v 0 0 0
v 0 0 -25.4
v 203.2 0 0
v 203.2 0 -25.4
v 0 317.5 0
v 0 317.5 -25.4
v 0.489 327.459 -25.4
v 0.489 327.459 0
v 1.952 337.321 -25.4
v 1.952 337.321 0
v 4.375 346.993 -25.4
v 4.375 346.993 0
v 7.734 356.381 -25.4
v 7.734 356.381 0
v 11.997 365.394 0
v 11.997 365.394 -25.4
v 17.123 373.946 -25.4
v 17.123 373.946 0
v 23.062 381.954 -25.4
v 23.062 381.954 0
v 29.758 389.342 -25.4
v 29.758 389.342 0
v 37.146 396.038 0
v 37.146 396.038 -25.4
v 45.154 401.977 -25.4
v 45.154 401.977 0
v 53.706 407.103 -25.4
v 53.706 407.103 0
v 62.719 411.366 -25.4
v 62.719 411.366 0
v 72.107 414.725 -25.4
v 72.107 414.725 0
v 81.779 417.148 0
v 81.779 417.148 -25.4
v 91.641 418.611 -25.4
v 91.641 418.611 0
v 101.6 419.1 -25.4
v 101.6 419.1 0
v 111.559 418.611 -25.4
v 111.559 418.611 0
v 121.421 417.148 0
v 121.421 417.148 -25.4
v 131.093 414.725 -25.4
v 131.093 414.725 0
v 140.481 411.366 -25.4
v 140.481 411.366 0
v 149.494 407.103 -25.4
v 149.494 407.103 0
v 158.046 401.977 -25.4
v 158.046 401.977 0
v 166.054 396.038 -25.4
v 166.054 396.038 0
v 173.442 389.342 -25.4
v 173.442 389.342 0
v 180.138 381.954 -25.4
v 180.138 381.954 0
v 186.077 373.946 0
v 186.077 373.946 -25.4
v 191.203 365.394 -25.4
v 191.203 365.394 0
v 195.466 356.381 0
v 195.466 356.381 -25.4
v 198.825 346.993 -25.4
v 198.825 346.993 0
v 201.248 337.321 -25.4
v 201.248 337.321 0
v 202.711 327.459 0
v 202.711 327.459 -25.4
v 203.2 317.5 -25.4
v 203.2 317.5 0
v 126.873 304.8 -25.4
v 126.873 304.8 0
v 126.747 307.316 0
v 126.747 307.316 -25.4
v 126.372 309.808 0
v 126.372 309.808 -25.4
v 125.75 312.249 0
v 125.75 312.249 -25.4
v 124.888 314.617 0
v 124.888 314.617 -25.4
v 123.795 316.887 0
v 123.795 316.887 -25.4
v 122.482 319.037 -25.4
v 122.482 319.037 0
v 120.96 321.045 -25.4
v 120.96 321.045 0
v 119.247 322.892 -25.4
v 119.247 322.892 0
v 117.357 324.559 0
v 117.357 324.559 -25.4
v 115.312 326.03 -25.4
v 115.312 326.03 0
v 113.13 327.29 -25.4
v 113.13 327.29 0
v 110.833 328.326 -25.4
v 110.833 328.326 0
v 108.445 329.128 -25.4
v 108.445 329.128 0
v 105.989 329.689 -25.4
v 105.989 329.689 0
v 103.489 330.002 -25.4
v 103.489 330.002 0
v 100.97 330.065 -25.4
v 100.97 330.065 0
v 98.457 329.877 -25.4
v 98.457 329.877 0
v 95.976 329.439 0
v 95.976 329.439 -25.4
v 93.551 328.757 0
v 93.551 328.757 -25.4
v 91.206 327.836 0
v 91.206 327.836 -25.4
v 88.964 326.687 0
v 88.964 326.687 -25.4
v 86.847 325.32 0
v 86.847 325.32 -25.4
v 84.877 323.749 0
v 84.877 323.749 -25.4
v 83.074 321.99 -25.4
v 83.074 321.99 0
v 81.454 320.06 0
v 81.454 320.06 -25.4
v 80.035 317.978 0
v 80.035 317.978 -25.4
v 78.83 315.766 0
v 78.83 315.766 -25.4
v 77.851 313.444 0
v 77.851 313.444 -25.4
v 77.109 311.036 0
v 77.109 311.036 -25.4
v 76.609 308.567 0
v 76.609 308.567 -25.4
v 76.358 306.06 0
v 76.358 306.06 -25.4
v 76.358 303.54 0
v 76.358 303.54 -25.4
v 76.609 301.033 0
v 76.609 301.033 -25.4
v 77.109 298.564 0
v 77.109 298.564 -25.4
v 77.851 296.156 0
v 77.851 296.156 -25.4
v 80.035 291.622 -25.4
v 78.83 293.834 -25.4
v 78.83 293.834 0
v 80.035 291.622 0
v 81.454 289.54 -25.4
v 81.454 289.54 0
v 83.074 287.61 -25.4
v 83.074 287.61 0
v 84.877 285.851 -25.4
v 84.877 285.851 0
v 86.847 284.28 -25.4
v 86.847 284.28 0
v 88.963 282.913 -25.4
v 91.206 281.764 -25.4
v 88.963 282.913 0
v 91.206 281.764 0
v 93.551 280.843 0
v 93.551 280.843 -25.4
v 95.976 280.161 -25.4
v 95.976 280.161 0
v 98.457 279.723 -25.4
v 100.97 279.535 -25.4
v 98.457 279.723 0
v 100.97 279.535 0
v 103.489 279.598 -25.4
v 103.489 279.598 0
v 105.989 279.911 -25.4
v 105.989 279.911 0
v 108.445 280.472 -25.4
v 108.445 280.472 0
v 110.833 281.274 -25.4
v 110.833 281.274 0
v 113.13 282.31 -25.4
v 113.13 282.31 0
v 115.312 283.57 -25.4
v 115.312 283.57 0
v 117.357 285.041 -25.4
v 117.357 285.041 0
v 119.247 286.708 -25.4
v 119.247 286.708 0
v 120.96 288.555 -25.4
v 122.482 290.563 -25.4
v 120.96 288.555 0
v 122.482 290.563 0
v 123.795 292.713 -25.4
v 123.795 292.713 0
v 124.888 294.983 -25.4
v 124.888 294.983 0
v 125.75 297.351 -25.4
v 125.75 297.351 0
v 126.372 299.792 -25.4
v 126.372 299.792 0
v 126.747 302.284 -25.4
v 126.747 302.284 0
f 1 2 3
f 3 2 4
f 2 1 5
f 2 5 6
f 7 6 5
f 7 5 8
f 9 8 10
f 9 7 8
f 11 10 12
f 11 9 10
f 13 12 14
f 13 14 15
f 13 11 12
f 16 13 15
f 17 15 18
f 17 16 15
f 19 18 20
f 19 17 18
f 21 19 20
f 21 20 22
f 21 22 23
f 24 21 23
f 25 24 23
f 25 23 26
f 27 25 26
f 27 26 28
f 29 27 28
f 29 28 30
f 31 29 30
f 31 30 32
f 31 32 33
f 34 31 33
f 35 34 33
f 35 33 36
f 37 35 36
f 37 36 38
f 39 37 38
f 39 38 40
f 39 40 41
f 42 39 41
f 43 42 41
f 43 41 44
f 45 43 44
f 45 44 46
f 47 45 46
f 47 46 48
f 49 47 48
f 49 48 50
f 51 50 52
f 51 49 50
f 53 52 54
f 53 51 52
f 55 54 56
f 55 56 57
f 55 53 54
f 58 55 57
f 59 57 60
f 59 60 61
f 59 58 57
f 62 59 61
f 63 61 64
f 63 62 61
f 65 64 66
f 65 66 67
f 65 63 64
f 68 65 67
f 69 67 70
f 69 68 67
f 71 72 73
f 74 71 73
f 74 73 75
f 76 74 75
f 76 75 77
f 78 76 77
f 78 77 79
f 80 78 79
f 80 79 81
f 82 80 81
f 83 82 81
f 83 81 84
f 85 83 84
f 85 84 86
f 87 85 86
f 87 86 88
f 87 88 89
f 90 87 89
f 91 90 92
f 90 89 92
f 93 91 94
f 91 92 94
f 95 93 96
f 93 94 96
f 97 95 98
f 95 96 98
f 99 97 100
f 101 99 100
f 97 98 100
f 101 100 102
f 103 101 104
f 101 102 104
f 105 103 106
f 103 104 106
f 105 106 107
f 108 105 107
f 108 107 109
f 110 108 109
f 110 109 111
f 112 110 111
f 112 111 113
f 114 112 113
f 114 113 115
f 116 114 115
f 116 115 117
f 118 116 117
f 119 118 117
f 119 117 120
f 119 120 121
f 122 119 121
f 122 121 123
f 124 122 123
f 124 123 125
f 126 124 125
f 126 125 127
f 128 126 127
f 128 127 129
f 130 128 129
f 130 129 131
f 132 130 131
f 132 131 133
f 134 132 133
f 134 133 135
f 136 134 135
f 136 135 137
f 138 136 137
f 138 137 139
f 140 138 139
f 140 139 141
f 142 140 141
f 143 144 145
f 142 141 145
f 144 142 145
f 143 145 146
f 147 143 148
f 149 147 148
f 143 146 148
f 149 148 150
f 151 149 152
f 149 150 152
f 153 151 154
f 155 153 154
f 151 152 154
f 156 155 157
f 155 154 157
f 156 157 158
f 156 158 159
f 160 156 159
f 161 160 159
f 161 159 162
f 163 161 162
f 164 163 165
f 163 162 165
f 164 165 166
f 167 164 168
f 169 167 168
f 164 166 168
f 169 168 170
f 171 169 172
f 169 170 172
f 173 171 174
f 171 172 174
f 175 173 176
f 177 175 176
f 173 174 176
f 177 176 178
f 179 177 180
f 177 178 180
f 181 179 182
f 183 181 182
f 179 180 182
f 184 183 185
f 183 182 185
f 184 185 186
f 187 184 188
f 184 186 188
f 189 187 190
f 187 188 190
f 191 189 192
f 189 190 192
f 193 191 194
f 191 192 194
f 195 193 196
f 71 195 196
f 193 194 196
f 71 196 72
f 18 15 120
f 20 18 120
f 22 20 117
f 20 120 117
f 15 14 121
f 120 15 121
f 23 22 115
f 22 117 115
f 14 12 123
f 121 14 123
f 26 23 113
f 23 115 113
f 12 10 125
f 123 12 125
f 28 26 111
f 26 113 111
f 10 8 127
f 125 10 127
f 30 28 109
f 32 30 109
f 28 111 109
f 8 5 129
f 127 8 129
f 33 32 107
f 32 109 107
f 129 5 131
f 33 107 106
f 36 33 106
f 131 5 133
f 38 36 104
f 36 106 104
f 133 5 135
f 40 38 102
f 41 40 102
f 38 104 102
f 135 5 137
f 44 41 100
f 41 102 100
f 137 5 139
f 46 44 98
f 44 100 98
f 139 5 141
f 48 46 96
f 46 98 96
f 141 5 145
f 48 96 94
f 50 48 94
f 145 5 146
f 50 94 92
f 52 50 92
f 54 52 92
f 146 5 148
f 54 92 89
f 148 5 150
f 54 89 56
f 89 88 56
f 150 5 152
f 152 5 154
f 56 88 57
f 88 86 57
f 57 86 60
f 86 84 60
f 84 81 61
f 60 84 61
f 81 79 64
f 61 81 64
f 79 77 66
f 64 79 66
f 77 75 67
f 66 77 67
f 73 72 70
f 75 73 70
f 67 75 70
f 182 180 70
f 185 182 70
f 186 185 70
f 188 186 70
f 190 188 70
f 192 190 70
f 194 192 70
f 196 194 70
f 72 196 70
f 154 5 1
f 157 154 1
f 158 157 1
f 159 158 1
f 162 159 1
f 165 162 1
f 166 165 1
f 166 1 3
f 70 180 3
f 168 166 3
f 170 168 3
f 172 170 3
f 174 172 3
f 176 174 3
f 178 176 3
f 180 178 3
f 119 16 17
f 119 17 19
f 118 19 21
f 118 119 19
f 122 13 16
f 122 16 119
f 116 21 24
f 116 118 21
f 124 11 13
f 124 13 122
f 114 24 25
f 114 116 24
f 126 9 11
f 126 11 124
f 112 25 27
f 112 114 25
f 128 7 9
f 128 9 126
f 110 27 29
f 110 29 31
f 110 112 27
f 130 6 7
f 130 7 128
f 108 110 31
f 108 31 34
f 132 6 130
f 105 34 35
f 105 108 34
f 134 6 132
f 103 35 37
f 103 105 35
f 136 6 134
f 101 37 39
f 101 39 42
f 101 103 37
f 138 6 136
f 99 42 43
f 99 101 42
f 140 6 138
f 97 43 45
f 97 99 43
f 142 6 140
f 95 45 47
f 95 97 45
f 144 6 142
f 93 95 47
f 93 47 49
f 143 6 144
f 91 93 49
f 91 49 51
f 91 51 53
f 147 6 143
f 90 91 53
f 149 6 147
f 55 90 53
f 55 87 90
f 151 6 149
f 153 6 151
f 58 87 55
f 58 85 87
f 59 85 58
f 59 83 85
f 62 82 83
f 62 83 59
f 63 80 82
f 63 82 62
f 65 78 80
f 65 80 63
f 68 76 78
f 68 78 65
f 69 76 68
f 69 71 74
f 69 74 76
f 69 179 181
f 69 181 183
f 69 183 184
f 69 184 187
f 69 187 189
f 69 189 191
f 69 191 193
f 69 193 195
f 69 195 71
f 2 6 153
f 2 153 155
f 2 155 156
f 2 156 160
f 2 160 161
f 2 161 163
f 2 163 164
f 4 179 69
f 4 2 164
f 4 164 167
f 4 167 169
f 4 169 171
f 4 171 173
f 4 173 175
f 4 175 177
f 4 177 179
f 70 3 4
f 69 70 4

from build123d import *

# Parameters (mm, degrees)
SKETCH1_W           = 203.2
SKETCH1_H           = 25.4
BOSS_EXTRUDE1_DEPTH = 609.6
SKETCH2_R           = 25.273
CUT_EXTRUDE1_DEPTH  = 644.07663618
CUT_EXTRUDE2_DEPTH  = 644.07663618


with BuildPart() as part:
    # Sketch1 → Boss-Extrude1 (new body)
    with BuildSketch(Plane(origin=(0, 0, 0), x_dir=(1, 0, 0), z_dir=(0, 1, 0))):
        with Locations((101.6, 12.7)):
            Rectangle(SKETCH1_W, SKETCH1_H)
    extrude(amount=BOSS_EXTRUDE1_DEPTH)

    # Sketch2 → Cut-Extrude1 (cut, through all)
    with BuildSketch(Plane.XY):
        with Locations((101.6, 304.8)):
            Circle(SKETCH2_R)
    extrude(amount=-CUT_EXTRUDE1_DEPTH, mode=Mode.SUBTRACT)

    # Sketch3 → Cut-Extrude2 (cut, through all)
    with BuildSketch(Plane(origin=(0, 0, -25.4), x_dir=(-1, 0, 0), z_dir=(0, 0, -1))):
        with BuildLine():
            Line((-203.2, 317.5), (-203.2, 609.6))
            Line((-203.2, 609.6), (0, 609.6))
            Line((0, 609.6), (0, 317.5))
            ThreePointArc((0, 317.5), (-101.6, 419.1), (-203.2, 317.5))
        make_face()
    extrude(amount=-CUT_EXTRUDE2_DEPTH, mode=Mode.SUBTRACT)


solid = part.part
